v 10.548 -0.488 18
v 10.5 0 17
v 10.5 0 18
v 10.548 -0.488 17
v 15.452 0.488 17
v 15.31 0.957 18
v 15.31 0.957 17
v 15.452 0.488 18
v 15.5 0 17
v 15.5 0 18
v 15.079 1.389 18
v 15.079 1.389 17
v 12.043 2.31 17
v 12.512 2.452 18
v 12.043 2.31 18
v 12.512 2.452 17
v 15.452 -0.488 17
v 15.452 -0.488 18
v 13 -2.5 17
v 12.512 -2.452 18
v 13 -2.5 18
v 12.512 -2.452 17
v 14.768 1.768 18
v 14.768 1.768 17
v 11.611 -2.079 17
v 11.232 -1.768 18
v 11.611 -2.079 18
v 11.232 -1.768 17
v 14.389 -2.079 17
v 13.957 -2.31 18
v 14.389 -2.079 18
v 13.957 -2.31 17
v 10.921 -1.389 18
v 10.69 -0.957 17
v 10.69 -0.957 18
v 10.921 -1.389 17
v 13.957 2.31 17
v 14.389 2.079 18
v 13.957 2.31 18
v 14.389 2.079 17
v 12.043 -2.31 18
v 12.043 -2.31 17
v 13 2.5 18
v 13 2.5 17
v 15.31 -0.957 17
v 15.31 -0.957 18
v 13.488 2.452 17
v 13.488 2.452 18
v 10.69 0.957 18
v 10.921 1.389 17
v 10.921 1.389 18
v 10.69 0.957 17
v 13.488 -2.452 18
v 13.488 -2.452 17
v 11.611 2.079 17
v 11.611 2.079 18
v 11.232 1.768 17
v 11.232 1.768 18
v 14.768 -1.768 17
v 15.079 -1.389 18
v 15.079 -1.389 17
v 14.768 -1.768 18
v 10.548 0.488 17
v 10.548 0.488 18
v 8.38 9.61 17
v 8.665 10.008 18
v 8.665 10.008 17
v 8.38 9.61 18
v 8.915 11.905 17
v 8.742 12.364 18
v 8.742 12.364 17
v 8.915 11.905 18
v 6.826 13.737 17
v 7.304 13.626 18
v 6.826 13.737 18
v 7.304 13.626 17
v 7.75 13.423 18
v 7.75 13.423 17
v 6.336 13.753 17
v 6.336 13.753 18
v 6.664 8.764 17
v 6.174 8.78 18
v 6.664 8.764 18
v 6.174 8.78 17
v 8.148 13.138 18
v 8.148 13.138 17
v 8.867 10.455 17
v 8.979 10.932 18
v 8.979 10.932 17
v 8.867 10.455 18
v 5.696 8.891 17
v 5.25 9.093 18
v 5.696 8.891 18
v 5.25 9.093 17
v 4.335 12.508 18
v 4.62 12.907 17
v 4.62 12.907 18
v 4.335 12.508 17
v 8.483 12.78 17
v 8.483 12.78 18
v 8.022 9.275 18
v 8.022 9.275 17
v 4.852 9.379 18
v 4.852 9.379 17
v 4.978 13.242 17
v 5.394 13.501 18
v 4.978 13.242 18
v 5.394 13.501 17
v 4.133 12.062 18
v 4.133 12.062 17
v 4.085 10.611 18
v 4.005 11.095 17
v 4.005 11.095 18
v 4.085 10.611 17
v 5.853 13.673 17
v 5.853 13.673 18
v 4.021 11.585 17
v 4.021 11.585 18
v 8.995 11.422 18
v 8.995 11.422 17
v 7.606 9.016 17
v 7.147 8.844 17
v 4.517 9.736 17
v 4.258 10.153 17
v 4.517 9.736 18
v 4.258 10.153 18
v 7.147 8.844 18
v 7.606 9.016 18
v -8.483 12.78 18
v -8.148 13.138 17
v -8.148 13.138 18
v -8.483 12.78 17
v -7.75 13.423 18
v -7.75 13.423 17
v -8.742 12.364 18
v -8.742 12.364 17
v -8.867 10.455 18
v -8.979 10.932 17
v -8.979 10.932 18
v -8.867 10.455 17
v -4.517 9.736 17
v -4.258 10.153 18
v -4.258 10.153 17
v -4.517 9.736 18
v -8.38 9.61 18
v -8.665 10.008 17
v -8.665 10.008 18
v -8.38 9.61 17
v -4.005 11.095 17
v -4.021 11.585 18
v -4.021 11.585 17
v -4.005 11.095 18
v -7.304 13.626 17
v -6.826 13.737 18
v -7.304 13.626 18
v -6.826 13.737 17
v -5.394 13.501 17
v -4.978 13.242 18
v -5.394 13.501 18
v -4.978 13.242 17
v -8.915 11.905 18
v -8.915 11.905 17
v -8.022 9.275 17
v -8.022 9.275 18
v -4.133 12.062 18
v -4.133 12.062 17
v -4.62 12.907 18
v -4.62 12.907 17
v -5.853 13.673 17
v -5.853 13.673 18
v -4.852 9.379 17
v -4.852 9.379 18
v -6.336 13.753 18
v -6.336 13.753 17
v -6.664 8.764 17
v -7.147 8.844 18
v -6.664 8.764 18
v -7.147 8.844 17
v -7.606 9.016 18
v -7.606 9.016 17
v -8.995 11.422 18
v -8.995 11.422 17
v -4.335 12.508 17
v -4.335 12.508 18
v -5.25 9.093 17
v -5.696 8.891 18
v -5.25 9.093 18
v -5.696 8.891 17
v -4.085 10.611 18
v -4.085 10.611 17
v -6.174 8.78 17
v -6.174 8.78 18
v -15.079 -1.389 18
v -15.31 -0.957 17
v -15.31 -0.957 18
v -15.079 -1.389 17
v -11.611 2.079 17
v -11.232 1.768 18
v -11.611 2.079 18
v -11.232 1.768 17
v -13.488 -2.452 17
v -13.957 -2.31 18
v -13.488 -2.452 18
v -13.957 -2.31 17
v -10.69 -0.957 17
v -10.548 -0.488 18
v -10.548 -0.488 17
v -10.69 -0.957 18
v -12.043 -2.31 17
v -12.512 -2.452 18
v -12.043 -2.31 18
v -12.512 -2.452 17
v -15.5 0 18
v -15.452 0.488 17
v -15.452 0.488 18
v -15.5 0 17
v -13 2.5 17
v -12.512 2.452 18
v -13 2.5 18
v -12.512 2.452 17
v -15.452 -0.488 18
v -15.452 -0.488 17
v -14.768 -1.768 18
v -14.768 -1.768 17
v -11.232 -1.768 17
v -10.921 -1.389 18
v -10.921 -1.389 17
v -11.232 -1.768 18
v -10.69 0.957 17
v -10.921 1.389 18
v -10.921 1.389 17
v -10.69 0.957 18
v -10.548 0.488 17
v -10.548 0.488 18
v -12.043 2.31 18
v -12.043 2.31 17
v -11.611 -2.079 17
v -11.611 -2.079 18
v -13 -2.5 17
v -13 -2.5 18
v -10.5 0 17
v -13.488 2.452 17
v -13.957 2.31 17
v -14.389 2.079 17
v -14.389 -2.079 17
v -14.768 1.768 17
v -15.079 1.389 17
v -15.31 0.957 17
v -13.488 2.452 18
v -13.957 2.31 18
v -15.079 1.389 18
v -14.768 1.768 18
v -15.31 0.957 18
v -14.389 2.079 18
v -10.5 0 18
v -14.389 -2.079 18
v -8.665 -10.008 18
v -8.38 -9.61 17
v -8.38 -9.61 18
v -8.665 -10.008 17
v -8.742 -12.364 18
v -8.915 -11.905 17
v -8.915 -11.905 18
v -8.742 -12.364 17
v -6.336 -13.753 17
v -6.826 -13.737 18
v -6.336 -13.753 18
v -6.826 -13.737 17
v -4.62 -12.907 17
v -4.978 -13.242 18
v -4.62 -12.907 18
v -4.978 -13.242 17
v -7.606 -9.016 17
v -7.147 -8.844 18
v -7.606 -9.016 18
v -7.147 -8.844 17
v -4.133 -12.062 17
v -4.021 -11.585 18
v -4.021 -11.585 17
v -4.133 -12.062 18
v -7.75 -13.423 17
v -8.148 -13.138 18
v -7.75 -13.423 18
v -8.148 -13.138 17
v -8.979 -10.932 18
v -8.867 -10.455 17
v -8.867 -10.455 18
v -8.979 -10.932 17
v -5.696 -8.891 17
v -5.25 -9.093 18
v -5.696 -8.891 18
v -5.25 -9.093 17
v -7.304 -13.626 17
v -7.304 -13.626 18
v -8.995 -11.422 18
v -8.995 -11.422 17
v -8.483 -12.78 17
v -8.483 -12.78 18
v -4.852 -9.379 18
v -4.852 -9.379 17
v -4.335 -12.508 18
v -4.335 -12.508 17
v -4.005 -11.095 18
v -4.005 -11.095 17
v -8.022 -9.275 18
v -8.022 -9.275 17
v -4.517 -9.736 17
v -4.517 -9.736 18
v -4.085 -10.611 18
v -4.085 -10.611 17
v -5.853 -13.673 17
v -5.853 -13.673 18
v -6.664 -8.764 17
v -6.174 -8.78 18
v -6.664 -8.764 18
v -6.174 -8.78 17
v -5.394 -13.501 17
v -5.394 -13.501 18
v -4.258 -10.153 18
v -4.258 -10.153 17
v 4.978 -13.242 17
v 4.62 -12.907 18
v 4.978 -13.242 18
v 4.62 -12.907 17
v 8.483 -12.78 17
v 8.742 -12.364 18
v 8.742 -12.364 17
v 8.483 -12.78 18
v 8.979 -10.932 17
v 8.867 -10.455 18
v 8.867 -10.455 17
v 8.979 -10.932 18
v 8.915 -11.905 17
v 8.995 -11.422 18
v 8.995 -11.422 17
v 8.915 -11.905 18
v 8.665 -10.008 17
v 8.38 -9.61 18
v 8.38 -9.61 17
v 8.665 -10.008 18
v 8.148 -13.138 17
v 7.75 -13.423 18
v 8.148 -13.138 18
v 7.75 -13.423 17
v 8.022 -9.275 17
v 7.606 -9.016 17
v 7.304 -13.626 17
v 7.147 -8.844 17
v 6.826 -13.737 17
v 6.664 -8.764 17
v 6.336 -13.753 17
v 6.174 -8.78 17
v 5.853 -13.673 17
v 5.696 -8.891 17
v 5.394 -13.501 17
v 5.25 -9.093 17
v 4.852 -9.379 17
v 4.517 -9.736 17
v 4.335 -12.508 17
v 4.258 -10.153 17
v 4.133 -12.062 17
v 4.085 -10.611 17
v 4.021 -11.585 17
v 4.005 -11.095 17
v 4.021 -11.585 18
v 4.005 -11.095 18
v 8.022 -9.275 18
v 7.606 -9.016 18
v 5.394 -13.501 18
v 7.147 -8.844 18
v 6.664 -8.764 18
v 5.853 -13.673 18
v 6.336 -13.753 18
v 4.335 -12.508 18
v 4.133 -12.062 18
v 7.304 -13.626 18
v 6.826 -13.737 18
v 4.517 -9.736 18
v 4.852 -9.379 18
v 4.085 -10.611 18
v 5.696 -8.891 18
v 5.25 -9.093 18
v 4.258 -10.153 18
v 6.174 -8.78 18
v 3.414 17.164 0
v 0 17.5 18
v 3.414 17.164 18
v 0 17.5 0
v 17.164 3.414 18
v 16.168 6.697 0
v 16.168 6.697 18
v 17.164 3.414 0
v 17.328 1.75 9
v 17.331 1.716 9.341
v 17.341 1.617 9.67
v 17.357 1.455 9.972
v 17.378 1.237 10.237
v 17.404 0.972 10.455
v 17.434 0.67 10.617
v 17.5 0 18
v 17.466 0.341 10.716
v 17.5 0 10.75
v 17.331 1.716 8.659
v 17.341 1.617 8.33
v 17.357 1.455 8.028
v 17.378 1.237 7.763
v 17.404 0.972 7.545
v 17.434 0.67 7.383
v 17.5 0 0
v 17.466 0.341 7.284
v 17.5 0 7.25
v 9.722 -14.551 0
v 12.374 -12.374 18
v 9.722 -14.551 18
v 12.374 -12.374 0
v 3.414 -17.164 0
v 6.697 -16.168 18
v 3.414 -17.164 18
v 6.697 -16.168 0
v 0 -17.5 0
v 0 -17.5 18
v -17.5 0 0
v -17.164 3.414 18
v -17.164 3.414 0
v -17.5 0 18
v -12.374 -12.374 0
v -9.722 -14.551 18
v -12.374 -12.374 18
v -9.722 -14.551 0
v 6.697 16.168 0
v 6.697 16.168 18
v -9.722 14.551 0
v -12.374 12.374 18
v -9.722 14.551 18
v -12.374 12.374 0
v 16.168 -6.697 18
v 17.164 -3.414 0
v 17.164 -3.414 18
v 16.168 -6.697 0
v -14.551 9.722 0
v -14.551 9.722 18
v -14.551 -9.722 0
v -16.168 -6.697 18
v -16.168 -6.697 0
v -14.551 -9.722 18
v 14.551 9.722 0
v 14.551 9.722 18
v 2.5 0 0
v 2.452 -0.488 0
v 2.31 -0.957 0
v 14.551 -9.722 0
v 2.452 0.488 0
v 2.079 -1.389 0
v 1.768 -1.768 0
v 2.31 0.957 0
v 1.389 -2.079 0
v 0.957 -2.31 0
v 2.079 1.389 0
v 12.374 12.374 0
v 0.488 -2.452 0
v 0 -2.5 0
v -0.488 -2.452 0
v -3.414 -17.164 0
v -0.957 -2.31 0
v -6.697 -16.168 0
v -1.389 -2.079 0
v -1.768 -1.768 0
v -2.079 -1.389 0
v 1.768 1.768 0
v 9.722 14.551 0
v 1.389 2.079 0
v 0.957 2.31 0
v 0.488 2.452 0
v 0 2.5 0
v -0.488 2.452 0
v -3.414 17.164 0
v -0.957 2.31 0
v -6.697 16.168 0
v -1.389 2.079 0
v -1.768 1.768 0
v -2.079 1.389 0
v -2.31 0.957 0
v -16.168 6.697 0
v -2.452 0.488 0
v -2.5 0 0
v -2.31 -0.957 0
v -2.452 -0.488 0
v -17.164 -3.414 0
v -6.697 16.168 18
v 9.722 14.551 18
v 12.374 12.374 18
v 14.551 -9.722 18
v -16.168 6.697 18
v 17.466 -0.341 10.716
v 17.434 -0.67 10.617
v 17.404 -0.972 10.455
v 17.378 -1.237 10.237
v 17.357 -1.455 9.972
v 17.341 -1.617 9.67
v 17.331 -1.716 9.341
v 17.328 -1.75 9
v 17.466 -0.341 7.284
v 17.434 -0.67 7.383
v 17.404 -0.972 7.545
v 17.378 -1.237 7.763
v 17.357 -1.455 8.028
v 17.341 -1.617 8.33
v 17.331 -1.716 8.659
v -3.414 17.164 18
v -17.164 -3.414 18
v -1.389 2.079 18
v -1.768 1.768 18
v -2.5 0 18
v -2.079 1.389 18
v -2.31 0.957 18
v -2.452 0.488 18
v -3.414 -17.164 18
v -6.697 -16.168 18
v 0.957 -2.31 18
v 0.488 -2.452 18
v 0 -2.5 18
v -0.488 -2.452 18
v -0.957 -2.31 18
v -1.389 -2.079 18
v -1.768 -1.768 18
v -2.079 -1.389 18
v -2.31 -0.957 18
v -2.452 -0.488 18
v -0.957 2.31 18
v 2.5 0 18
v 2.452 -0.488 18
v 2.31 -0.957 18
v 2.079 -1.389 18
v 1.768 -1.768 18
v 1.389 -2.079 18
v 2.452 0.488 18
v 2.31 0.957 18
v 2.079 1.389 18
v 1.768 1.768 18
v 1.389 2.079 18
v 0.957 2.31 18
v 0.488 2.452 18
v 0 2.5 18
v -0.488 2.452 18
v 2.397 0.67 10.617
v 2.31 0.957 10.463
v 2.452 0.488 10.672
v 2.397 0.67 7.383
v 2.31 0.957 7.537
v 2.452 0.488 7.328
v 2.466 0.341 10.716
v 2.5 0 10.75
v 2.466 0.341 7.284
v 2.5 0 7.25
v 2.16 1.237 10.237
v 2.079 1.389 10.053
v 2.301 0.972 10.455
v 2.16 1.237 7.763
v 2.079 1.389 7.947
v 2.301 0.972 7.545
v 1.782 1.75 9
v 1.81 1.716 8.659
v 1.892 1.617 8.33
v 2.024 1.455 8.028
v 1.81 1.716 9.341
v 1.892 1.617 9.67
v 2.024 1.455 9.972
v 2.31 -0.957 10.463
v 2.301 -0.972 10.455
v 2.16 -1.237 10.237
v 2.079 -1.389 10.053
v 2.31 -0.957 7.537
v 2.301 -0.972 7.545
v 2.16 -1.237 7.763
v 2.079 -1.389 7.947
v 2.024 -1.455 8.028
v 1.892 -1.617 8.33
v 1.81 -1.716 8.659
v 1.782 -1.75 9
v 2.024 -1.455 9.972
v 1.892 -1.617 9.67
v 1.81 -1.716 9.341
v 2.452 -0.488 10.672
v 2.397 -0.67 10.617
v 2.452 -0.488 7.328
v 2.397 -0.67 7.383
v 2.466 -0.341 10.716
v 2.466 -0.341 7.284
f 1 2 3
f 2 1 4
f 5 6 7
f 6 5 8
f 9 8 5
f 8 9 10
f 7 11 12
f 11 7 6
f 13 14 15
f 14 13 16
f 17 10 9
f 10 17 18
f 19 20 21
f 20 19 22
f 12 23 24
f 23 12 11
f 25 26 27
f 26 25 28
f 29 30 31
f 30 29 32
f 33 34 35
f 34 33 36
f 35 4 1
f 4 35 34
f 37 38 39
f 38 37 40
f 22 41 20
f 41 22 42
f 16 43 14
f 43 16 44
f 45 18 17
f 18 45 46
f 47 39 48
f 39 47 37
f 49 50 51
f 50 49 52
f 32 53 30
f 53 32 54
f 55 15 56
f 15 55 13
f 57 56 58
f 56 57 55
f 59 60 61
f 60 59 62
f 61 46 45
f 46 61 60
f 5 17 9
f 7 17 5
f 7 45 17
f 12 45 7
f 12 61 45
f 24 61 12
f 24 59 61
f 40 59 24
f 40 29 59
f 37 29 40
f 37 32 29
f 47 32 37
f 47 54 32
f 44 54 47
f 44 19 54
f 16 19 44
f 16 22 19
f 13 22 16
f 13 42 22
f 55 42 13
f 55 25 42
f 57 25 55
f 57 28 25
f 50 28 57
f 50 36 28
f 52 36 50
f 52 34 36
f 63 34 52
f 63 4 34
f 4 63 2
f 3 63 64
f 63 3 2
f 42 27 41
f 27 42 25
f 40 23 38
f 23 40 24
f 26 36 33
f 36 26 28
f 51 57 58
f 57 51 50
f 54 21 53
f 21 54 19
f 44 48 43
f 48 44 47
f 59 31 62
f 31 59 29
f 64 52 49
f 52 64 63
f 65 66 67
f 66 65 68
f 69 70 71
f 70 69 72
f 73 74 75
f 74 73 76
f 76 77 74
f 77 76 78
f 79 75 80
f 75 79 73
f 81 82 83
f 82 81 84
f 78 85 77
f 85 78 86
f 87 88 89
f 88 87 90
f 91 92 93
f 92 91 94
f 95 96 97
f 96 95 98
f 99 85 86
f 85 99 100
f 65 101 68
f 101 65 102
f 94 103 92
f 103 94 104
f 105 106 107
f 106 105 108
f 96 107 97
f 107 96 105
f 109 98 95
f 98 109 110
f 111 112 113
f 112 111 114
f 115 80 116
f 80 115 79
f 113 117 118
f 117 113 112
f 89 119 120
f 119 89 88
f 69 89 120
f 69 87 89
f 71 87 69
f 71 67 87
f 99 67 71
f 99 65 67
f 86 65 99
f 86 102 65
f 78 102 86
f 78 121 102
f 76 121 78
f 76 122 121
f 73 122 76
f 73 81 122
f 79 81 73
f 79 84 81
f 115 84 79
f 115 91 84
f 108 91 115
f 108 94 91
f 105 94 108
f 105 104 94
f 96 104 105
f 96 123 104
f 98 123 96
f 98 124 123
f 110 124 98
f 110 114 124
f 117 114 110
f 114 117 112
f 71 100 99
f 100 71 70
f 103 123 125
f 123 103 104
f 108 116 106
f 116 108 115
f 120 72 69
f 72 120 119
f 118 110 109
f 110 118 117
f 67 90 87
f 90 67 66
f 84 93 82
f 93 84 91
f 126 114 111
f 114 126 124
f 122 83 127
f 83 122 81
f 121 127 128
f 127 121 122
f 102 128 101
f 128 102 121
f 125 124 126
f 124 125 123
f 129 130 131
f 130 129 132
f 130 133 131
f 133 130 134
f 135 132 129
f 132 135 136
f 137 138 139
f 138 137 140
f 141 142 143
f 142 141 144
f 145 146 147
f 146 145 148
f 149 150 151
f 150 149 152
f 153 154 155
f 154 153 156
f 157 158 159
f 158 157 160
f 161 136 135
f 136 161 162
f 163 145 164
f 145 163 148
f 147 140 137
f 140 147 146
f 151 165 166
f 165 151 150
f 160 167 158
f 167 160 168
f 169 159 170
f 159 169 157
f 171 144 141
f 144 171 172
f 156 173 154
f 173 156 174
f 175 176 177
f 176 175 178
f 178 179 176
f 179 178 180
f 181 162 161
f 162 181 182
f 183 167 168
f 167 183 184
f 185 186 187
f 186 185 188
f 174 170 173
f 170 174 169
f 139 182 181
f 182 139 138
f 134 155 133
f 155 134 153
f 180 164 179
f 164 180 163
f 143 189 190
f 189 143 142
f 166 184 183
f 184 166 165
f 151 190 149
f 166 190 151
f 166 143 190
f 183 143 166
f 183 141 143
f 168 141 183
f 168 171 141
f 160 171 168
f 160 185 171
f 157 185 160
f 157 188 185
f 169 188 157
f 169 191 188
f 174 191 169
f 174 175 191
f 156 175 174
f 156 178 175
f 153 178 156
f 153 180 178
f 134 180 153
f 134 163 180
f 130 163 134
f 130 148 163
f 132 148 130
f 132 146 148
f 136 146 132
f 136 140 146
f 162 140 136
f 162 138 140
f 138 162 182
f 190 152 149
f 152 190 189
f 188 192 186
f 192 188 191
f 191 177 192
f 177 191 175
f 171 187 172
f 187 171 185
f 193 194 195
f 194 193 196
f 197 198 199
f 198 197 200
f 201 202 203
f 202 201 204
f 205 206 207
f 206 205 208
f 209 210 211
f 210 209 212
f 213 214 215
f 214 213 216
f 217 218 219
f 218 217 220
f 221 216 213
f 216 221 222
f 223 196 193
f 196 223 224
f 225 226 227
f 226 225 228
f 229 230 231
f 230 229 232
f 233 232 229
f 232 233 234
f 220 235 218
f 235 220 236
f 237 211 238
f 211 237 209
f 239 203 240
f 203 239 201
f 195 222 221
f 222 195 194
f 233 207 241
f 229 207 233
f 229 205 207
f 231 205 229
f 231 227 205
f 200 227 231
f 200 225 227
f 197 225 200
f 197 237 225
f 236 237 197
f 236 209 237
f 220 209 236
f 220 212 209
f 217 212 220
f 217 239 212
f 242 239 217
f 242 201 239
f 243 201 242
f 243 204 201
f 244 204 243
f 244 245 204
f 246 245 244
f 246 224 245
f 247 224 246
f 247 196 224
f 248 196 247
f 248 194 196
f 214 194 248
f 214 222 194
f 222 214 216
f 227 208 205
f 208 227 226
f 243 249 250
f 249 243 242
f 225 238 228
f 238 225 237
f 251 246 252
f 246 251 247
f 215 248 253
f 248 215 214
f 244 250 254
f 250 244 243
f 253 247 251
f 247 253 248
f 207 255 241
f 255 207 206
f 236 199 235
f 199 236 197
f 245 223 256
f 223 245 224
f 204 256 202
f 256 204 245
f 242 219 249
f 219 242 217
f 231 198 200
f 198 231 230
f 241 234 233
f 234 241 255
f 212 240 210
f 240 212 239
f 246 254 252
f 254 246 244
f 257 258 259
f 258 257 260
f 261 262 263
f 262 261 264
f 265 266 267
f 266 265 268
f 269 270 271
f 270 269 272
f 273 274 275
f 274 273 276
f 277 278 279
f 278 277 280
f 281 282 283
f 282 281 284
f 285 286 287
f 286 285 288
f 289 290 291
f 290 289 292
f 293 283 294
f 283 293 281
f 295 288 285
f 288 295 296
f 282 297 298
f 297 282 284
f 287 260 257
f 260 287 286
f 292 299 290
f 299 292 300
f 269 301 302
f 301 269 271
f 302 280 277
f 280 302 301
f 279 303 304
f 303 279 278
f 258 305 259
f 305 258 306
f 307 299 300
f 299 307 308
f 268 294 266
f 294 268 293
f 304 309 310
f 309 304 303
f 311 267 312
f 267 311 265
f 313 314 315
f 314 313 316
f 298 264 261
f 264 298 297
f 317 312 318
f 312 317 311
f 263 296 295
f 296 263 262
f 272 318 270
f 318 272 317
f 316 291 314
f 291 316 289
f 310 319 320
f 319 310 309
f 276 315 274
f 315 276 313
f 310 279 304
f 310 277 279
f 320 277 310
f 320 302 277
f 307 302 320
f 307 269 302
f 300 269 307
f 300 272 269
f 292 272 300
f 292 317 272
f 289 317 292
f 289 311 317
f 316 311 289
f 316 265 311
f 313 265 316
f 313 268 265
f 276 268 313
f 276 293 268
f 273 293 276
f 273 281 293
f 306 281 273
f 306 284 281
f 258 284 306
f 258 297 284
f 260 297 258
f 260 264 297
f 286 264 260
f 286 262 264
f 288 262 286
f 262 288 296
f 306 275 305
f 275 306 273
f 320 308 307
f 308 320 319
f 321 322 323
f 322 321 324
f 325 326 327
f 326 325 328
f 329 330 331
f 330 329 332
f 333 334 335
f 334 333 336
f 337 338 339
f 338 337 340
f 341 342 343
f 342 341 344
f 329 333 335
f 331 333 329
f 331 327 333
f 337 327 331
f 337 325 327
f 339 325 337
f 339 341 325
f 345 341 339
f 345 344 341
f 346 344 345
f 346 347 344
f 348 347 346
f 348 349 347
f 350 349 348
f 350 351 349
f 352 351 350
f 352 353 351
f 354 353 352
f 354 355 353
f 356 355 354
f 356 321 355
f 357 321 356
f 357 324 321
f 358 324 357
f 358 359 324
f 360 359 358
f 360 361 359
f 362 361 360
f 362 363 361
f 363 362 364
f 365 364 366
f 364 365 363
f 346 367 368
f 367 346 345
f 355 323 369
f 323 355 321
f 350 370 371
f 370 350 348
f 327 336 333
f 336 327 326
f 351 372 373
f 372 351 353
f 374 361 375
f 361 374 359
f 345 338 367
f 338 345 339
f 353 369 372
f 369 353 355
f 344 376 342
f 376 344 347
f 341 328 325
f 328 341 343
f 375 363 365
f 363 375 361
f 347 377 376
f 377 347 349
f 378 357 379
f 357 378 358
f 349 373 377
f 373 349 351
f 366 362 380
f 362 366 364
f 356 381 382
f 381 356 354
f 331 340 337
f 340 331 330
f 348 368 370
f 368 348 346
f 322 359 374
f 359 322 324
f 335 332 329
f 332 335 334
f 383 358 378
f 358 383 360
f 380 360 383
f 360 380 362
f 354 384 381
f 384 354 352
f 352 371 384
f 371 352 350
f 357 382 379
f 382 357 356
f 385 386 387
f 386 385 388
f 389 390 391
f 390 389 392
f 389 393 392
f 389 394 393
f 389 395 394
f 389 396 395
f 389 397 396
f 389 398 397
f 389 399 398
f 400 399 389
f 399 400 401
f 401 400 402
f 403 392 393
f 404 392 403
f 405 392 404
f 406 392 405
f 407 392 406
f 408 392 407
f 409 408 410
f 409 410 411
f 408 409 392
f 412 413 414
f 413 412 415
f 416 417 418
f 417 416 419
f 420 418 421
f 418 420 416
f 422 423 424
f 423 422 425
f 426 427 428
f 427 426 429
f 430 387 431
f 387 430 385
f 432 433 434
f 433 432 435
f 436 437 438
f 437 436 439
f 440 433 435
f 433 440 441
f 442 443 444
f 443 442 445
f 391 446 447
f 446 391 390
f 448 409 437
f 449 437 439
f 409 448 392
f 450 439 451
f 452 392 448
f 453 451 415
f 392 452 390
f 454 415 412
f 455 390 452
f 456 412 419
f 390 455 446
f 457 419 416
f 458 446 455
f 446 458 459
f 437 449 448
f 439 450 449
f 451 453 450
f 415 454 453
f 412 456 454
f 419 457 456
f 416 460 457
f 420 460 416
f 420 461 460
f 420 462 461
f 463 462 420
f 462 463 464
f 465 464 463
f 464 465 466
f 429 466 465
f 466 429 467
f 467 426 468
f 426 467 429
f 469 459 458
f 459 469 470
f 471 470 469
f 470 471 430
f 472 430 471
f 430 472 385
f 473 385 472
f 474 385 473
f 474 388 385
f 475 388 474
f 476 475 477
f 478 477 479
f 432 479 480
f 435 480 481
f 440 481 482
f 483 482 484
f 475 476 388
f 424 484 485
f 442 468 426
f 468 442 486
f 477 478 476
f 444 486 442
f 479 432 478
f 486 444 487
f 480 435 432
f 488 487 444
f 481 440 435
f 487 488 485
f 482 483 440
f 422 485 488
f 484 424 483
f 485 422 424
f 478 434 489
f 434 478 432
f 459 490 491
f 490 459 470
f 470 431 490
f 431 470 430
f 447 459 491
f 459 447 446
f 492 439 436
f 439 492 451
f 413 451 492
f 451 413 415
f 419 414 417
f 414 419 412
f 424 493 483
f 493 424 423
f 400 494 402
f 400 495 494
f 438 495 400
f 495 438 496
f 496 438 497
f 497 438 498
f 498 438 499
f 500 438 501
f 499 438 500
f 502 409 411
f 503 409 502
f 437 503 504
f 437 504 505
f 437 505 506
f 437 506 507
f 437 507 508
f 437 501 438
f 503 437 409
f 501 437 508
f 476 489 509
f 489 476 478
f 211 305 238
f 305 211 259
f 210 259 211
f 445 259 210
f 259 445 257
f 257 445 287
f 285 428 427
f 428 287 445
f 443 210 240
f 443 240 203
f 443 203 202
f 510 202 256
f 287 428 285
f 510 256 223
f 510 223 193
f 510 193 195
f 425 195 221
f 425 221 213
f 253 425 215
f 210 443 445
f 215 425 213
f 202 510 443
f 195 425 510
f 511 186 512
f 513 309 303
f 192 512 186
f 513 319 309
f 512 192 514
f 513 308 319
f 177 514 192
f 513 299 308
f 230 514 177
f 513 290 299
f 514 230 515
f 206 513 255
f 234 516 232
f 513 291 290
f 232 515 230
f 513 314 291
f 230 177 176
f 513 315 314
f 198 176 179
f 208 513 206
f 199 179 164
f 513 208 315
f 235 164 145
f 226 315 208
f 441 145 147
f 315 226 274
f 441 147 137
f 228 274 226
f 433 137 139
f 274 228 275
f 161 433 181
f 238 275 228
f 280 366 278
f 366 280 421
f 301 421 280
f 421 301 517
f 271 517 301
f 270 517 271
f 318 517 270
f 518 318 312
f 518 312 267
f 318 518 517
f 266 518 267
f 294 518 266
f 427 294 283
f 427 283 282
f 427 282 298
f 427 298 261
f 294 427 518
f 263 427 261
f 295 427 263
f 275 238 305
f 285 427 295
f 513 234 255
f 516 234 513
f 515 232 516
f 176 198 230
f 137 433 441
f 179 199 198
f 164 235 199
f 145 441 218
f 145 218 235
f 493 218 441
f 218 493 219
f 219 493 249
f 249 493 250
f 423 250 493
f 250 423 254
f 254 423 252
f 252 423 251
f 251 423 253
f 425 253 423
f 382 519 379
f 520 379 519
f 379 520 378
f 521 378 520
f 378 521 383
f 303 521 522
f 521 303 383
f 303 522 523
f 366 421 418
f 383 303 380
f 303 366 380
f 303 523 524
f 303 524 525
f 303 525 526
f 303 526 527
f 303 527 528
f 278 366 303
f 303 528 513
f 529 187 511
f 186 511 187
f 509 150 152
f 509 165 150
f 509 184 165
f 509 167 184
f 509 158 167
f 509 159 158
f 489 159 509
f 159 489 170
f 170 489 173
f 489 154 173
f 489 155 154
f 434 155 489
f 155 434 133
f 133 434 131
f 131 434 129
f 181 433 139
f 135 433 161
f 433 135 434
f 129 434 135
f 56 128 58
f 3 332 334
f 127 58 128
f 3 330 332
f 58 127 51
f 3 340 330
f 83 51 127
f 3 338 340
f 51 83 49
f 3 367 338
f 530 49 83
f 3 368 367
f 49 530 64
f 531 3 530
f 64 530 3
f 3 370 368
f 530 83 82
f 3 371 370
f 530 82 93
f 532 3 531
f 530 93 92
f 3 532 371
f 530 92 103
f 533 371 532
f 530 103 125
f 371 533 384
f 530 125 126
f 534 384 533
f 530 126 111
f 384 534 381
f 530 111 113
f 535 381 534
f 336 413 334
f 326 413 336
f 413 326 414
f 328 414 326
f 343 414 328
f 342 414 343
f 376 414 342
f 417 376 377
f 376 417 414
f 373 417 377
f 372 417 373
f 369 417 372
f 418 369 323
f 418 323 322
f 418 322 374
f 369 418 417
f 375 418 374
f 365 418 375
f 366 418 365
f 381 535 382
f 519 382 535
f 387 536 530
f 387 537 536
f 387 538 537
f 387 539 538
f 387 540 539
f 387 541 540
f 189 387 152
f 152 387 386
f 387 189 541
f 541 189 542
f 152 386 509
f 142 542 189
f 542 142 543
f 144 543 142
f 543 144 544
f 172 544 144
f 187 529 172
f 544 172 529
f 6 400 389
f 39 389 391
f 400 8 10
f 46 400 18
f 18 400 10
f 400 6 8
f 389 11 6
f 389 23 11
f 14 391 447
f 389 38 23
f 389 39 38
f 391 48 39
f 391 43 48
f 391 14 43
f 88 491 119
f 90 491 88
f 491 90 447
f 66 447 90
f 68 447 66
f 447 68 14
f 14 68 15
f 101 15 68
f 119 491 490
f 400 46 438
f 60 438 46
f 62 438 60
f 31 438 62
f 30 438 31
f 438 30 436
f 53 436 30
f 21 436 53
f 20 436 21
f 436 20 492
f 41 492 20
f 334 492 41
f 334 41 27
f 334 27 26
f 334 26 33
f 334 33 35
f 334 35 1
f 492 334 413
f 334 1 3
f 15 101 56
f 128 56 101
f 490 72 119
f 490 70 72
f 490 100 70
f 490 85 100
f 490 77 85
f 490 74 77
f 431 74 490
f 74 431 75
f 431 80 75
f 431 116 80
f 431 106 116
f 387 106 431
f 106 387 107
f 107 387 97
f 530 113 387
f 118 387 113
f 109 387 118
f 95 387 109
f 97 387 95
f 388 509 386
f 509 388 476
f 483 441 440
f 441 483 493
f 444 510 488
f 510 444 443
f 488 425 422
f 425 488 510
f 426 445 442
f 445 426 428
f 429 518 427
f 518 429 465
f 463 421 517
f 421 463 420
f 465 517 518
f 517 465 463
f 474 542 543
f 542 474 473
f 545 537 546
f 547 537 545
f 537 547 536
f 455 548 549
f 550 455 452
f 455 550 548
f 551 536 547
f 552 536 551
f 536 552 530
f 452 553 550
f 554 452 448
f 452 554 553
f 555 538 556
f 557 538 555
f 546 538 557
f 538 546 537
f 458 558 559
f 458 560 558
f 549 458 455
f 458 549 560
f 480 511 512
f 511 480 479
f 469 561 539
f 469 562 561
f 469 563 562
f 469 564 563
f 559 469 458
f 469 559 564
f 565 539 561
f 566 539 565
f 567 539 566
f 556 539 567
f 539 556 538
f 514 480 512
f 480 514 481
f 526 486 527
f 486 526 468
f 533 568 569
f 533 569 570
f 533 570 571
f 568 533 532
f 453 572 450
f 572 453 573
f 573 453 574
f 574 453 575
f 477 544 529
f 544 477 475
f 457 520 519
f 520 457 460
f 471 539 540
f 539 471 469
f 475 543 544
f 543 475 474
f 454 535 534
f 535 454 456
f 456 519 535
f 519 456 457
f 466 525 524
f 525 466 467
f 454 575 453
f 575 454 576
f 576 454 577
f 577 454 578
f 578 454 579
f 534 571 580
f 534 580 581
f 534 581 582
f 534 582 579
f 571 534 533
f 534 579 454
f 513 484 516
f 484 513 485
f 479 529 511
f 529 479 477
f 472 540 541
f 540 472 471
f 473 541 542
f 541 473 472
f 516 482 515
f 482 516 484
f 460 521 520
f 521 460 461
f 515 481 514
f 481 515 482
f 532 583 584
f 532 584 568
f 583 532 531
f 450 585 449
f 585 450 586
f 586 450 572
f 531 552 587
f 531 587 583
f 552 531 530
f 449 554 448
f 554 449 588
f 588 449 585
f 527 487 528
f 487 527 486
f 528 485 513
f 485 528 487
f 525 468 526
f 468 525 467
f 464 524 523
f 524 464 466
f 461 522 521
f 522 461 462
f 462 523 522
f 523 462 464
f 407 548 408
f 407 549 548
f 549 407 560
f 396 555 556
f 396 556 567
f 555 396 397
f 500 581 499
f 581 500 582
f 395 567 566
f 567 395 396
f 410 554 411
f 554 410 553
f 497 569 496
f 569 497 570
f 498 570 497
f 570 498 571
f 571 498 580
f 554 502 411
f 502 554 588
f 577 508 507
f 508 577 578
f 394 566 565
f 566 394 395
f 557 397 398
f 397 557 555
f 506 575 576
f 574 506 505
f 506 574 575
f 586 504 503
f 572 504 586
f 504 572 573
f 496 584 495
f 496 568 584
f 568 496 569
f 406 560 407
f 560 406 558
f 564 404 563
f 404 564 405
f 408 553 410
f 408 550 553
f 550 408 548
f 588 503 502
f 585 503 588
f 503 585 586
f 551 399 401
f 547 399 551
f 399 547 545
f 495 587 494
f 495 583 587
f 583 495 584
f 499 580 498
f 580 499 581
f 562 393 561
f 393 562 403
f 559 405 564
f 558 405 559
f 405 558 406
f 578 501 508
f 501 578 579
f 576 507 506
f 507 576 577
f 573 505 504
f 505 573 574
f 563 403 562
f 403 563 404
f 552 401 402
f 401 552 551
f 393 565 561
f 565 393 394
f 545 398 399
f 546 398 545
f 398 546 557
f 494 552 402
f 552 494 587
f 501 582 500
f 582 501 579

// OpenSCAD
$fn = 32;

// ----------------------------------------------------------------------
// Control knob: dimpled knob
// ----------------------------------------------------------------------

// --- parameters (mm) ---
dimp_d = 5;               // finger dimple diameter
n_dimp = 6;               // number of dimples
dimp_r = 13;              // dimple ring radius
knob_d = 35;              // knob body diameter
knob_h = 18;              // knob body height
bore_d = 5;               // shaft bore diameter
set_d = 3.5;              // set screw bore diameter
fit_tol = 0.02;           // tolerance for press fits, mm
free_tol = 0.2;           // tolerance for clearance fits, mm

dimp_step = 360 / n_dimp;  // dimple angular step

difference() {
  cylinder(h = knob_h, d = knob_d);
  translate([0, 0, -1]) cylinder(h = knob_h + 2, d = bore_d);
  translate([-1, 0, knob_h / 2]) rotate([0, 90, 0])
    cylinder(h = knob_d / 2 + bore_d / 2 + 2, d = set_d);  for (i = [0 : n_dimp - 1])
    rotate([0, 0, i * dimp_step])
      translate([dimp_r, 0, knob_h - 1])
        cylinder(h = 2, d = dimp_d);
}
